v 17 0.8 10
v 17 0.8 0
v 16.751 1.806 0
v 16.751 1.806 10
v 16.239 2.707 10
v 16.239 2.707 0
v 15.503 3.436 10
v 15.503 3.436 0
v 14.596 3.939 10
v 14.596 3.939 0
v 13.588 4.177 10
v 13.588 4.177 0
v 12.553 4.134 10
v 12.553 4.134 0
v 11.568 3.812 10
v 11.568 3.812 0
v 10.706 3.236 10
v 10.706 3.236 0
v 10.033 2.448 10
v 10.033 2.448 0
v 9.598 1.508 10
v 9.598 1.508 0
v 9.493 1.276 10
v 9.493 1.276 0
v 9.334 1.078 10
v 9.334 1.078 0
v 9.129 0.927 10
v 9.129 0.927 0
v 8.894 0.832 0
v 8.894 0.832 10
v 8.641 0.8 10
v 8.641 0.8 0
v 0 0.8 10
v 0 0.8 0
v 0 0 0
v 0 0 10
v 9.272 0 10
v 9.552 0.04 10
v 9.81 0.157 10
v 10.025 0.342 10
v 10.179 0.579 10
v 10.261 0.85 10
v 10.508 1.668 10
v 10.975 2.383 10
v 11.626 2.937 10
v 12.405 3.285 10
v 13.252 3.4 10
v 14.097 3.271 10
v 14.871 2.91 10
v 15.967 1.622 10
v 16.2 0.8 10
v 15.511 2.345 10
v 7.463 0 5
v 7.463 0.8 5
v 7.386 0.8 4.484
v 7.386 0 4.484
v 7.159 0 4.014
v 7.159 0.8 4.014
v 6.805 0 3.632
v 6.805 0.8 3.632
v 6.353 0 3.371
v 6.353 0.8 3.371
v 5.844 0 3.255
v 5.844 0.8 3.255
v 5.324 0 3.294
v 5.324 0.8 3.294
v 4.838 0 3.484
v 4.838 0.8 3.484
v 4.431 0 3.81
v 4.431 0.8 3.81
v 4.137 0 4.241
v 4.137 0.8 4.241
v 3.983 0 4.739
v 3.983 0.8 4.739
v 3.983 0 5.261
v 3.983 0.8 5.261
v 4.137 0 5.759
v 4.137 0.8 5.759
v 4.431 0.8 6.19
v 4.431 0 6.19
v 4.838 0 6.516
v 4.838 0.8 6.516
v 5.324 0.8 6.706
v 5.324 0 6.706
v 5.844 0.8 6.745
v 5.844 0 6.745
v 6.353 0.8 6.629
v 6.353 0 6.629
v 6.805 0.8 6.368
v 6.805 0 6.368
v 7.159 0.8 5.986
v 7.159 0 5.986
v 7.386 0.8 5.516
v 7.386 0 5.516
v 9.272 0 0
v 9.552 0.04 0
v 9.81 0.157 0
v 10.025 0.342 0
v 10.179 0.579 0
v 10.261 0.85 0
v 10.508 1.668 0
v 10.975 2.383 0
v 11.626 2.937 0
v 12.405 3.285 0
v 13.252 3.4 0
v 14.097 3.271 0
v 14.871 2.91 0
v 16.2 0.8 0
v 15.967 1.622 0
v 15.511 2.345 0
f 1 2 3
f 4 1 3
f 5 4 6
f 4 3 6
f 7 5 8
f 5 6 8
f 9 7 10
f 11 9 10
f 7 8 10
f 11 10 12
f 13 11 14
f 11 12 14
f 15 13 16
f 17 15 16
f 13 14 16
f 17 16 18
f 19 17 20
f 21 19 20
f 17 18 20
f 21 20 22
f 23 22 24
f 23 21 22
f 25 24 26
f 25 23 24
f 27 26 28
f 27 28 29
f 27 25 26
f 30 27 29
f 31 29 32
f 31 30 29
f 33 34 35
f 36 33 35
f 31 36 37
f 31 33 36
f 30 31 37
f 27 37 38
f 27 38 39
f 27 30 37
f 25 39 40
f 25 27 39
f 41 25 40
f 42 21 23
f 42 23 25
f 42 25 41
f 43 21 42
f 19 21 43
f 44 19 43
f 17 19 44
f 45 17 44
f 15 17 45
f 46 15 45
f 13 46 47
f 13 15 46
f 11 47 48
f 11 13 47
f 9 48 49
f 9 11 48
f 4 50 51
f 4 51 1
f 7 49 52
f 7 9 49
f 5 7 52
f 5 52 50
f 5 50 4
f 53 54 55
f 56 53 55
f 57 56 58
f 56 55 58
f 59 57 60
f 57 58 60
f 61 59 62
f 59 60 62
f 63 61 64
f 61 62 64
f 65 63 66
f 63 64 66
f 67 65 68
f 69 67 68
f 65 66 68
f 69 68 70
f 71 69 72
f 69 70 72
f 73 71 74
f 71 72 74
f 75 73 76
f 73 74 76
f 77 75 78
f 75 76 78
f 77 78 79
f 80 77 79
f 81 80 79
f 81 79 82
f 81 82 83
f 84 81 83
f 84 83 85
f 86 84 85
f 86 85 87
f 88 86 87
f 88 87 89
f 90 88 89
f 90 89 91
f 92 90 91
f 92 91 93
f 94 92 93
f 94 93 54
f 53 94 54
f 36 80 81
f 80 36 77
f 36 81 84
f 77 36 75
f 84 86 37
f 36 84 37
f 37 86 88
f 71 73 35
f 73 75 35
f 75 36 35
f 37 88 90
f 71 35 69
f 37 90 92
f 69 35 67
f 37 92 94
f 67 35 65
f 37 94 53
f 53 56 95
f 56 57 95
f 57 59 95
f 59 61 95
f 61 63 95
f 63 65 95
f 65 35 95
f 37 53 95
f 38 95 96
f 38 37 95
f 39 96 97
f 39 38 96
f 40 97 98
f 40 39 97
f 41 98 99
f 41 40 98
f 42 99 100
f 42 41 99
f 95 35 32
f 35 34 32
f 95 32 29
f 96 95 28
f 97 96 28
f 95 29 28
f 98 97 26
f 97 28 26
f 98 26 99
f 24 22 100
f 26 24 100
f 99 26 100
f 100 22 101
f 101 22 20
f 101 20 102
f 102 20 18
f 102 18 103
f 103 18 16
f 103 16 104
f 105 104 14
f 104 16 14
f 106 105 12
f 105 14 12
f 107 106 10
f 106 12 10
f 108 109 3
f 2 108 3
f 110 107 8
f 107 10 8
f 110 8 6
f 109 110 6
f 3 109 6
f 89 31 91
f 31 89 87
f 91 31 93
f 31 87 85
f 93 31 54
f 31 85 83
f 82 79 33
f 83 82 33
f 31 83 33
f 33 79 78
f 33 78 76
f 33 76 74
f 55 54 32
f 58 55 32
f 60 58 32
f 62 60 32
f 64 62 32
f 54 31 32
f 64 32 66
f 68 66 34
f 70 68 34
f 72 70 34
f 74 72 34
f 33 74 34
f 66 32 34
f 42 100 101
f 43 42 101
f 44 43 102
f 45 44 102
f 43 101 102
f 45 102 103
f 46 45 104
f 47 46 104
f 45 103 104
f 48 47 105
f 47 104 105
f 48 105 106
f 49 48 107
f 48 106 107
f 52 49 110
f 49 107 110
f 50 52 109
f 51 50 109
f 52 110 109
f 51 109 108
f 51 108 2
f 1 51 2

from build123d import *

# Parameters (mm, degrees)
BOSS_EXTRUDE1_DEPTH = 10
FILLET1_R           = 1
SKETCH3_R           = 1.75
CUT_EXTRUDE1_DEPTH  = 1.8


with BuildPart() as part:
    # Sketch2 → Boss-Extrude1 (new body)
    with BuildSketch(Plane.XY):
        with BuildLine():
            Line((0, 0), (10.253572501, 0))
            ThreePointArc((10.253572501, 0), (12.826786251, 3.373213749), (16.2, 0.8))
            Line((16.2, 0.8), (17, 0.8))
            ThreePointArc((17, 0.8), (13.226786251, 4.194356599), (9.453572501, 0.8))
            Line((9.453572501, 0.8), (0, 0.8))
            Line((0, 0.8), (0, 0))
        make_face()
    extrude(amount=BOSS_EXTRUDE1_DEPTH)

    # Fillet1
    fillet1_edges = [part.edges().sort_by_distance(p)[0] for p in [
        (9.453572501, 0.8, 5),
        (10.253572501, 0, 5),
    ]]
    fillet(fillet1_edges, radius=FILLET1_R)

    # Sketch3 → Cut-Extrude1 (cut, through all)
    with BuildSketch(Plane(origin=(0, 0.8, 0), x_dir=(1, 0, 0), z_dir=(0, 1, 0))):
        with Locations((5.713393125, -5)):
            Circle(SKETCH3_R)
    extrude(amount=-CUT_EXTRUDE1_DEPTH, mode=Mode.SUBTRACT)


solid = part.part
